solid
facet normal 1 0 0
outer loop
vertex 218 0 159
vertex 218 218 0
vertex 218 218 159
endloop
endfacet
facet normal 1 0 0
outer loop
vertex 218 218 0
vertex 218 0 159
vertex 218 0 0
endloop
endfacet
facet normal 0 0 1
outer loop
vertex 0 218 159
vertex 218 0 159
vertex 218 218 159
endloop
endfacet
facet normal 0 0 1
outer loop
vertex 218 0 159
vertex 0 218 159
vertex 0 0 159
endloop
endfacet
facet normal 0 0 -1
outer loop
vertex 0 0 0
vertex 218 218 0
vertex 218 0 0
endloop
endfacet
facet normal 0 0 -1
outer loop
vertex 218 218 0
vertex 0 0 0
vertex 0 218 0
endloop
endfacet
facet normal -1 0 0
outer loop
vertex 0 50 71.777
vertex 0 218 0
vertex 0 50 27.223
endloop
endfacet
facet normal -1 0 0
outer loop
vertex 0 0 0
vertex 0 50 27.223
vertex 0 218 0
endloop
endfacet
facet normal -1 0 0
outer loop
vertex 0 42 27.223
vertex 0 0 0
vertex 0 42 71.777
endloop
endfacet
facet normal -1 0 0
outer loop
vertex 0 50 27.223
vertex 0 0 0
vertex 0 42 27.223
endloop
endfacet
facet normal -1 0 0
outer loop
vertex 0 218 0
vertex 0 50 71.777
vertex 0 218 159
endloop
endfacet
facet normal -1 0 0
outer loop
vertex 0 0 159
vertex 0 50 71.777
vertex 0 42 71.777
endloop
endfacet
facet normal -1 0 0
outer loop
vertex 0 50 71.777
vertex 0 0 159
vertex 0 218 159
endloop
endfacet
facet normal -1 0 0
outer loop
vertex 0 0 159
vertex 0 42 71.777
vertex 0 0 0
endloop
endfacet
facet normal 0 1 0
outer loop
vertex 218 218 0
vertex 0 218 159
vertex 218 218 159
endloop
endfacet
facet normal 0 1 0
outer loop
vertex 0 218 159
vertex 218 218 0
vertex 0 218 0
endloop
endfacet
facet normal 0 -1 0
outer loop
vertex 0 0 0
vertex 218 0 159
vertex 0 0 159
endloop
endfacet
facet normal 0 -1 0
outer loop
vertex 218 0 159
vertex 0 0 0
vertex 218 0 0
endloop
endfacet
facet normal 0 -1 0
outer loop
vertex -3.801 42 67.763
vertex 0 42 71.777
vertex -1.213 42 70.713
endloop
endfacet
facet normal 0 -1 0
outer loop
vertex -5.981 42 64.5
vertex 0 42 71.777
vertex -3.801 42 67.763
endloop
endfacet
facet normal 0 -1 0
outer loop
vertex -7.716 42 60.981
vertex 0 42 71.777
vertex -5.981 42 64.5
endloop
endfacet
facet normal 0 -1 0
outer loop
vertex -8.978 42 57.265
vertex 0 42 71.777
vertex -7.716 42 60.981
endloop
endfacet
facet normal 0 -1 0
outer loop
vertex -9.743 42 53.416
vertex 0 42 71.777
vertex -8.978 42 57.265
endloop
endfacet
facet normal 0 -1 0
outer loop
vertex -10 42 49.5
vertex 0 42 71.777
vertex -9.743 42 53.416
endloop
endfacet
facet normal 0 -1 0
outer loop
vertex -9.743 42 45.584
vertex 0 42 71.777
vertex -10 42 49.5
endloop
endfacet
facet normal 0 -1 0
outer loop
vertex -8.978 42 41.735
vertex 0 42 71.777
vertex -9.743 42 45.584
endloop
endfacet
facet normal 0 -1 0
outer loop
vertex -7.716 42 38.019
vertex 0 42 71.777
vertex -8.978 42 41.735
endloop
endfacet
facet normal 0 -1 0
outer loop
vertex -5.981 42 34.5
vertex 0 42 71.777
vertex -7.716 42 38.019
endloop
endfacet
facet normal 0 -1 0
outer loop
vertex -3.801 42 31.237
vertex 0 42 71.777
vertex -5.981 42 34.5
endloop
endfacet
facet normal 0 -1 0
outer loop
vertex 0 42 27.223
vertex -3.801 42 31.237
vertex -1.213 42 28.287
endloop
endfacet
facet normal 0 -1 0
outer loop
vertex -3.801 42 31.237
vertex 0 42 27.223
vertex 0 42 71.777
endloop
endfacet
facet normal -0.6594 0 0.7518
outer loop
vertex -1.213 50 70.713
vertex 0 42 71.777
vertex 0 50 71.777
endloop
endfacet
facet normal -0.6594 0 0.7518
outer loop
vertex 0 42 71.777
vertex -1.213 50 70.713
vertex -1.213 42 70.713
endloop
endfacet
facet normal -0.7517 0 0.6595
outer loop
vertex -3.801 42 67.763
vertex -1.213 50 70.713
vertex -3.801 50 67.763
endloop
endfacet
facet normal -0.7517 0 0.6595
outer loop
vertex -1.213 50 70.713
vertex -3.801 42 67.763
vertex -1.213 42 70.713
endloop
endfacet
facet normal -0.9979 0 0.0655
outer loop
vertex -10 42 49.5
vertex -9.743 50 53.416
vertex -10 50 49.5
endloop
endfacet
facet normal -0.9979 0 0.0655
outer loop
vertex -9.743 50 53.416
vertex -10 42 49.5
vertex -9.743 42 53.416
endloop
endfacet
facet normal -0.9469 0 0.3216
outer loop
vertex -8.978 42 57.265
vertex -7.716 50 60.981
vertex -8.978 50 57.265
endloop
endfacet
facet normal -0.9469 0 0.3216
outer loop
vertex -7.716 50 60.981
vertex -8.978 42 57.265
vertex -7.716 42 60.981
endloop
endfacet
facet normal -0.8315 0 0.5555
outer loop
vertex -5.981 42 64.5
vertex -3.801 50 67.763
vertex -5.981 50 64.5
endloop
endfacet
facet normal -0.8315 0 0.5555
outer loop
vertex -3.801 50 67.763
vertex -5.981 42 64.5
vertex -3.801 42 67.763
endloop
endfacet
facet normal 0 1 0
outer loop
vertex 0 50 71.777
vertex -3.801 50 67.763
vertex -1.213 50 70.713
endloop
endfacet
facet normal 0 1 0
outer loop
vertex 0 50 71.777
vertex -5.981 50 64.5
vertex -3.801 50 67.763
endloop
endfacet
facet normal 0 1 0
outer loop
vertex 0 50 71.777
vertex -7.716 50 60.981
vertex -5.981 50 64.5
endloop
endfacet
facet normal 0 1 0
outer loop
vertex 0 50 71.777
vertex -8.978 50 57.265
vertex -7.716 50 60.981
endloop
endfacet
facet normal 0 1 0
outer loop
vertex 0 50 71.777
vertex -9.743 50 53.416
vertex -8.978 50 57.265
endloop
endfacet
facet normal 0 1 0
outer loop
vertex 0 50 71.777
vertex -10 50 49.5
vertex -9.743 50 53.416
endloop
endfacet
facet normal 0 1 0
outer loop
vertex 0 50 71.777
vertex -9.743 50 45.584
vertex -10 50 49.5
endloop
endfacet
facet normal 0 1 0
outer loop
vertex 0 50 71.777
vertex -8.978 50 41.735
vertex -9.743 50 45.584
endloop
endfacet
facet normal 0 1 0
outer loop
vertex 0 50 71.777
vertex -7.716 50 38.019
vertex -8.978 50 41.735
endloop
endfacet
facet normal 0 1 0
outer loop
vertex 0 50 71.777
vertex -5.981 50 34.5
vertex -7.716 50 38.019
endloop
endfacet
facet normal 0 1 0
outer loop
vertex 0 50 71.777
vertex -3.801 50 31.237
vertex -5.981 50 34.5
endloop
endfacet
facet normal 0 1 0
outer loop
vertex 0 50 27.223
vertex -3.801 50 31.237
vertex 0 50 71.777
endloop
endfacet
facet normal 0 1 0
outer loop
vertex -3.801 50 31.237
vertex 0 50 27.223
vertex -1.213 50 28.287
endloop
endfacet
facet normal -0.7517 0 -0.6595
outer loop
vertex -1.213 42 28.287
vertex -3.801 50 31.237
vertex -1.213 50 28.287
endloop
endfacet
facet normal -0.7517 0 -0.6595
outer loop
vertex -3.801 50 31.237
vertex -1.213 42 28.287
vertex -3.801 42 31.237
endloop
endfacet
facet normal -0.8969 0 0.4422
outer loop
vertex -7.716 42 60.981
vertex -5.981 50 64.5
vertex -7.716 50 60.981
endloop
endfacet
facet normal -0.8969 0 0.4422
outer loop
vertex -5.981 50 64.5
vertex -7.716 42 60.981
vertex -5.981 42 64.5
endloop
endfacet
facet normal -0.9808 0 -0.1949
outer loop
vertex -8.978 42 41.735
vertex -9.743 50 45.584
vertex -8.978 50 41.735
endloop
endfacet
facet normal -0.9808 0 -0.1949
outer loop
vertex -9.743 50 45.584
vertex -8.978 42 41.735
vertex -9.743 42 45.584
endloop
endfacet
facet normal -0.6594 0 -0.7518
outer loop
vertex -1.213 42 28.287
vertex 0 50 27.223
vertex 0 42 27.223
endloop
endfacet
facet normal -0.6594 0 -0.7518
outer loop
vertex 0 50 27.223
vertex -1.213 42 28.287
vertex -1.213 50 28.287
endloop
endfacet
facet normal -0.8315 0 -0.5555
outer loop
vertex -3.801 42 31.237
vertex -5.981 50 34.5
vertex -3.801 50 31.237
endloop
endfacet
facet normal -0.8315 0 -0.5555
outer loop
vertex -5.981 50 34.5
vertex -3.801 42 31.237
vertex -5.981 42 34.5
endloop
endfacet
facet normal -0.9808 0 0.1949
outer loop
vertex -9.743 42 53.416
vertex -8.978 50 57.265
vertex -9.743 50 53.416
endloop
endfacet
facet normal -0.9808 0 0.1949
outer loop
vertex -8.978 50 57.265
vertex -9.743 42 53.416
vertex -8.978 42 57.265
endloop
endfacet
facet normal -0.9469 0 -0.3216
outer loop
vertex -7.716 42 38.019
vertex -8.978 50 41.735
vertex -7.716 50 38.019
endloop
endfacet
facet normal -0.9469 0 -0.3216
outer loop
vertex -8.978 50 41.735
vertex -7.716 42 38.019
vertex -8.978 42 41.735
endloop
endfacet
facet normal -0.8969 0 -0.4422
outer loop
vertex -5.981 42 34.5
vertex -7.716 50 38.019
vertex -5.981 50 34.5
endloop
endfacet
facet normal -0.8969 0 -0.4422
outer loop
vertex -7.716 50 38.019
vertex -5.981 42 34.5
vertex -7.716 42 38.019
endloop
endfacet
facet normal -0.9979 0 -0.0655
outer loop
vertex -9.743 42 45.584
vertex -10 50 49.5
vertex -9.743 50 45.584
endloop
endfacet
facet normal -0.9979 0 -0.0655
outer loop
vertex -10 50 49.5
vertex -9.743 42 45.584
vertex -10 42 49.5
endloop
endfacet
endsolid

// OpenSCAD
// ====== PARAMETERS (edit these!) ======
filter_OD   = 200;          // mm: filter outer diameter (or width)
filter_height = 150;        // mm: filter height
box_wall    = 4;            // mm: wall thickness
box_gap     = 5;            // mm: clearance around filter
inlet_d     = 60;           // mm: inlet tube diameter
inlet_xy    = [20, 50];     // mm: inlet center from front-bottom-left
outlet_d    = 50;           // mm: outlet tube diameter
outlet_xyz  = [180, 100, 80]; // mm: outlet center from front-bottom-left

// ====== CALCULATED SIZES ======
box_w = filter_OD + 2*box_gap + 2*box_wall;
box_l = filter_OD + 2*box_gap + 2*box_wall;
box_h = filter_height + box_gap + box_wall;

// ====== MODULE ======
module airbox() {
  // Outer shell
  cube([box_w, box_l, box_h]);

  // Inner cavity (filter space)
  translate([box_wall, box_wall, box_wall])
    cube([box_w - 2*box_wall,
          box_l - 2*box_wall,
          box_h - box_wall]);

  // Inlet port
  translate([inlet_xy[0], inlet_xy[1], box_h/2 - inlet_d/2])
    rotate([90, 0, 0])
      cylinder(h = box_wall*2, r = inlet_d/2, $fn = 48);

  // Outlet port
  translate(outlet_xyz)
    rotate([90, 0, 0])
      cylinder(h = box_wall*2, r = outlet_d/2, $fn = 48);
}

// ====== RENDER ======
difference() {
  airbox();
}
